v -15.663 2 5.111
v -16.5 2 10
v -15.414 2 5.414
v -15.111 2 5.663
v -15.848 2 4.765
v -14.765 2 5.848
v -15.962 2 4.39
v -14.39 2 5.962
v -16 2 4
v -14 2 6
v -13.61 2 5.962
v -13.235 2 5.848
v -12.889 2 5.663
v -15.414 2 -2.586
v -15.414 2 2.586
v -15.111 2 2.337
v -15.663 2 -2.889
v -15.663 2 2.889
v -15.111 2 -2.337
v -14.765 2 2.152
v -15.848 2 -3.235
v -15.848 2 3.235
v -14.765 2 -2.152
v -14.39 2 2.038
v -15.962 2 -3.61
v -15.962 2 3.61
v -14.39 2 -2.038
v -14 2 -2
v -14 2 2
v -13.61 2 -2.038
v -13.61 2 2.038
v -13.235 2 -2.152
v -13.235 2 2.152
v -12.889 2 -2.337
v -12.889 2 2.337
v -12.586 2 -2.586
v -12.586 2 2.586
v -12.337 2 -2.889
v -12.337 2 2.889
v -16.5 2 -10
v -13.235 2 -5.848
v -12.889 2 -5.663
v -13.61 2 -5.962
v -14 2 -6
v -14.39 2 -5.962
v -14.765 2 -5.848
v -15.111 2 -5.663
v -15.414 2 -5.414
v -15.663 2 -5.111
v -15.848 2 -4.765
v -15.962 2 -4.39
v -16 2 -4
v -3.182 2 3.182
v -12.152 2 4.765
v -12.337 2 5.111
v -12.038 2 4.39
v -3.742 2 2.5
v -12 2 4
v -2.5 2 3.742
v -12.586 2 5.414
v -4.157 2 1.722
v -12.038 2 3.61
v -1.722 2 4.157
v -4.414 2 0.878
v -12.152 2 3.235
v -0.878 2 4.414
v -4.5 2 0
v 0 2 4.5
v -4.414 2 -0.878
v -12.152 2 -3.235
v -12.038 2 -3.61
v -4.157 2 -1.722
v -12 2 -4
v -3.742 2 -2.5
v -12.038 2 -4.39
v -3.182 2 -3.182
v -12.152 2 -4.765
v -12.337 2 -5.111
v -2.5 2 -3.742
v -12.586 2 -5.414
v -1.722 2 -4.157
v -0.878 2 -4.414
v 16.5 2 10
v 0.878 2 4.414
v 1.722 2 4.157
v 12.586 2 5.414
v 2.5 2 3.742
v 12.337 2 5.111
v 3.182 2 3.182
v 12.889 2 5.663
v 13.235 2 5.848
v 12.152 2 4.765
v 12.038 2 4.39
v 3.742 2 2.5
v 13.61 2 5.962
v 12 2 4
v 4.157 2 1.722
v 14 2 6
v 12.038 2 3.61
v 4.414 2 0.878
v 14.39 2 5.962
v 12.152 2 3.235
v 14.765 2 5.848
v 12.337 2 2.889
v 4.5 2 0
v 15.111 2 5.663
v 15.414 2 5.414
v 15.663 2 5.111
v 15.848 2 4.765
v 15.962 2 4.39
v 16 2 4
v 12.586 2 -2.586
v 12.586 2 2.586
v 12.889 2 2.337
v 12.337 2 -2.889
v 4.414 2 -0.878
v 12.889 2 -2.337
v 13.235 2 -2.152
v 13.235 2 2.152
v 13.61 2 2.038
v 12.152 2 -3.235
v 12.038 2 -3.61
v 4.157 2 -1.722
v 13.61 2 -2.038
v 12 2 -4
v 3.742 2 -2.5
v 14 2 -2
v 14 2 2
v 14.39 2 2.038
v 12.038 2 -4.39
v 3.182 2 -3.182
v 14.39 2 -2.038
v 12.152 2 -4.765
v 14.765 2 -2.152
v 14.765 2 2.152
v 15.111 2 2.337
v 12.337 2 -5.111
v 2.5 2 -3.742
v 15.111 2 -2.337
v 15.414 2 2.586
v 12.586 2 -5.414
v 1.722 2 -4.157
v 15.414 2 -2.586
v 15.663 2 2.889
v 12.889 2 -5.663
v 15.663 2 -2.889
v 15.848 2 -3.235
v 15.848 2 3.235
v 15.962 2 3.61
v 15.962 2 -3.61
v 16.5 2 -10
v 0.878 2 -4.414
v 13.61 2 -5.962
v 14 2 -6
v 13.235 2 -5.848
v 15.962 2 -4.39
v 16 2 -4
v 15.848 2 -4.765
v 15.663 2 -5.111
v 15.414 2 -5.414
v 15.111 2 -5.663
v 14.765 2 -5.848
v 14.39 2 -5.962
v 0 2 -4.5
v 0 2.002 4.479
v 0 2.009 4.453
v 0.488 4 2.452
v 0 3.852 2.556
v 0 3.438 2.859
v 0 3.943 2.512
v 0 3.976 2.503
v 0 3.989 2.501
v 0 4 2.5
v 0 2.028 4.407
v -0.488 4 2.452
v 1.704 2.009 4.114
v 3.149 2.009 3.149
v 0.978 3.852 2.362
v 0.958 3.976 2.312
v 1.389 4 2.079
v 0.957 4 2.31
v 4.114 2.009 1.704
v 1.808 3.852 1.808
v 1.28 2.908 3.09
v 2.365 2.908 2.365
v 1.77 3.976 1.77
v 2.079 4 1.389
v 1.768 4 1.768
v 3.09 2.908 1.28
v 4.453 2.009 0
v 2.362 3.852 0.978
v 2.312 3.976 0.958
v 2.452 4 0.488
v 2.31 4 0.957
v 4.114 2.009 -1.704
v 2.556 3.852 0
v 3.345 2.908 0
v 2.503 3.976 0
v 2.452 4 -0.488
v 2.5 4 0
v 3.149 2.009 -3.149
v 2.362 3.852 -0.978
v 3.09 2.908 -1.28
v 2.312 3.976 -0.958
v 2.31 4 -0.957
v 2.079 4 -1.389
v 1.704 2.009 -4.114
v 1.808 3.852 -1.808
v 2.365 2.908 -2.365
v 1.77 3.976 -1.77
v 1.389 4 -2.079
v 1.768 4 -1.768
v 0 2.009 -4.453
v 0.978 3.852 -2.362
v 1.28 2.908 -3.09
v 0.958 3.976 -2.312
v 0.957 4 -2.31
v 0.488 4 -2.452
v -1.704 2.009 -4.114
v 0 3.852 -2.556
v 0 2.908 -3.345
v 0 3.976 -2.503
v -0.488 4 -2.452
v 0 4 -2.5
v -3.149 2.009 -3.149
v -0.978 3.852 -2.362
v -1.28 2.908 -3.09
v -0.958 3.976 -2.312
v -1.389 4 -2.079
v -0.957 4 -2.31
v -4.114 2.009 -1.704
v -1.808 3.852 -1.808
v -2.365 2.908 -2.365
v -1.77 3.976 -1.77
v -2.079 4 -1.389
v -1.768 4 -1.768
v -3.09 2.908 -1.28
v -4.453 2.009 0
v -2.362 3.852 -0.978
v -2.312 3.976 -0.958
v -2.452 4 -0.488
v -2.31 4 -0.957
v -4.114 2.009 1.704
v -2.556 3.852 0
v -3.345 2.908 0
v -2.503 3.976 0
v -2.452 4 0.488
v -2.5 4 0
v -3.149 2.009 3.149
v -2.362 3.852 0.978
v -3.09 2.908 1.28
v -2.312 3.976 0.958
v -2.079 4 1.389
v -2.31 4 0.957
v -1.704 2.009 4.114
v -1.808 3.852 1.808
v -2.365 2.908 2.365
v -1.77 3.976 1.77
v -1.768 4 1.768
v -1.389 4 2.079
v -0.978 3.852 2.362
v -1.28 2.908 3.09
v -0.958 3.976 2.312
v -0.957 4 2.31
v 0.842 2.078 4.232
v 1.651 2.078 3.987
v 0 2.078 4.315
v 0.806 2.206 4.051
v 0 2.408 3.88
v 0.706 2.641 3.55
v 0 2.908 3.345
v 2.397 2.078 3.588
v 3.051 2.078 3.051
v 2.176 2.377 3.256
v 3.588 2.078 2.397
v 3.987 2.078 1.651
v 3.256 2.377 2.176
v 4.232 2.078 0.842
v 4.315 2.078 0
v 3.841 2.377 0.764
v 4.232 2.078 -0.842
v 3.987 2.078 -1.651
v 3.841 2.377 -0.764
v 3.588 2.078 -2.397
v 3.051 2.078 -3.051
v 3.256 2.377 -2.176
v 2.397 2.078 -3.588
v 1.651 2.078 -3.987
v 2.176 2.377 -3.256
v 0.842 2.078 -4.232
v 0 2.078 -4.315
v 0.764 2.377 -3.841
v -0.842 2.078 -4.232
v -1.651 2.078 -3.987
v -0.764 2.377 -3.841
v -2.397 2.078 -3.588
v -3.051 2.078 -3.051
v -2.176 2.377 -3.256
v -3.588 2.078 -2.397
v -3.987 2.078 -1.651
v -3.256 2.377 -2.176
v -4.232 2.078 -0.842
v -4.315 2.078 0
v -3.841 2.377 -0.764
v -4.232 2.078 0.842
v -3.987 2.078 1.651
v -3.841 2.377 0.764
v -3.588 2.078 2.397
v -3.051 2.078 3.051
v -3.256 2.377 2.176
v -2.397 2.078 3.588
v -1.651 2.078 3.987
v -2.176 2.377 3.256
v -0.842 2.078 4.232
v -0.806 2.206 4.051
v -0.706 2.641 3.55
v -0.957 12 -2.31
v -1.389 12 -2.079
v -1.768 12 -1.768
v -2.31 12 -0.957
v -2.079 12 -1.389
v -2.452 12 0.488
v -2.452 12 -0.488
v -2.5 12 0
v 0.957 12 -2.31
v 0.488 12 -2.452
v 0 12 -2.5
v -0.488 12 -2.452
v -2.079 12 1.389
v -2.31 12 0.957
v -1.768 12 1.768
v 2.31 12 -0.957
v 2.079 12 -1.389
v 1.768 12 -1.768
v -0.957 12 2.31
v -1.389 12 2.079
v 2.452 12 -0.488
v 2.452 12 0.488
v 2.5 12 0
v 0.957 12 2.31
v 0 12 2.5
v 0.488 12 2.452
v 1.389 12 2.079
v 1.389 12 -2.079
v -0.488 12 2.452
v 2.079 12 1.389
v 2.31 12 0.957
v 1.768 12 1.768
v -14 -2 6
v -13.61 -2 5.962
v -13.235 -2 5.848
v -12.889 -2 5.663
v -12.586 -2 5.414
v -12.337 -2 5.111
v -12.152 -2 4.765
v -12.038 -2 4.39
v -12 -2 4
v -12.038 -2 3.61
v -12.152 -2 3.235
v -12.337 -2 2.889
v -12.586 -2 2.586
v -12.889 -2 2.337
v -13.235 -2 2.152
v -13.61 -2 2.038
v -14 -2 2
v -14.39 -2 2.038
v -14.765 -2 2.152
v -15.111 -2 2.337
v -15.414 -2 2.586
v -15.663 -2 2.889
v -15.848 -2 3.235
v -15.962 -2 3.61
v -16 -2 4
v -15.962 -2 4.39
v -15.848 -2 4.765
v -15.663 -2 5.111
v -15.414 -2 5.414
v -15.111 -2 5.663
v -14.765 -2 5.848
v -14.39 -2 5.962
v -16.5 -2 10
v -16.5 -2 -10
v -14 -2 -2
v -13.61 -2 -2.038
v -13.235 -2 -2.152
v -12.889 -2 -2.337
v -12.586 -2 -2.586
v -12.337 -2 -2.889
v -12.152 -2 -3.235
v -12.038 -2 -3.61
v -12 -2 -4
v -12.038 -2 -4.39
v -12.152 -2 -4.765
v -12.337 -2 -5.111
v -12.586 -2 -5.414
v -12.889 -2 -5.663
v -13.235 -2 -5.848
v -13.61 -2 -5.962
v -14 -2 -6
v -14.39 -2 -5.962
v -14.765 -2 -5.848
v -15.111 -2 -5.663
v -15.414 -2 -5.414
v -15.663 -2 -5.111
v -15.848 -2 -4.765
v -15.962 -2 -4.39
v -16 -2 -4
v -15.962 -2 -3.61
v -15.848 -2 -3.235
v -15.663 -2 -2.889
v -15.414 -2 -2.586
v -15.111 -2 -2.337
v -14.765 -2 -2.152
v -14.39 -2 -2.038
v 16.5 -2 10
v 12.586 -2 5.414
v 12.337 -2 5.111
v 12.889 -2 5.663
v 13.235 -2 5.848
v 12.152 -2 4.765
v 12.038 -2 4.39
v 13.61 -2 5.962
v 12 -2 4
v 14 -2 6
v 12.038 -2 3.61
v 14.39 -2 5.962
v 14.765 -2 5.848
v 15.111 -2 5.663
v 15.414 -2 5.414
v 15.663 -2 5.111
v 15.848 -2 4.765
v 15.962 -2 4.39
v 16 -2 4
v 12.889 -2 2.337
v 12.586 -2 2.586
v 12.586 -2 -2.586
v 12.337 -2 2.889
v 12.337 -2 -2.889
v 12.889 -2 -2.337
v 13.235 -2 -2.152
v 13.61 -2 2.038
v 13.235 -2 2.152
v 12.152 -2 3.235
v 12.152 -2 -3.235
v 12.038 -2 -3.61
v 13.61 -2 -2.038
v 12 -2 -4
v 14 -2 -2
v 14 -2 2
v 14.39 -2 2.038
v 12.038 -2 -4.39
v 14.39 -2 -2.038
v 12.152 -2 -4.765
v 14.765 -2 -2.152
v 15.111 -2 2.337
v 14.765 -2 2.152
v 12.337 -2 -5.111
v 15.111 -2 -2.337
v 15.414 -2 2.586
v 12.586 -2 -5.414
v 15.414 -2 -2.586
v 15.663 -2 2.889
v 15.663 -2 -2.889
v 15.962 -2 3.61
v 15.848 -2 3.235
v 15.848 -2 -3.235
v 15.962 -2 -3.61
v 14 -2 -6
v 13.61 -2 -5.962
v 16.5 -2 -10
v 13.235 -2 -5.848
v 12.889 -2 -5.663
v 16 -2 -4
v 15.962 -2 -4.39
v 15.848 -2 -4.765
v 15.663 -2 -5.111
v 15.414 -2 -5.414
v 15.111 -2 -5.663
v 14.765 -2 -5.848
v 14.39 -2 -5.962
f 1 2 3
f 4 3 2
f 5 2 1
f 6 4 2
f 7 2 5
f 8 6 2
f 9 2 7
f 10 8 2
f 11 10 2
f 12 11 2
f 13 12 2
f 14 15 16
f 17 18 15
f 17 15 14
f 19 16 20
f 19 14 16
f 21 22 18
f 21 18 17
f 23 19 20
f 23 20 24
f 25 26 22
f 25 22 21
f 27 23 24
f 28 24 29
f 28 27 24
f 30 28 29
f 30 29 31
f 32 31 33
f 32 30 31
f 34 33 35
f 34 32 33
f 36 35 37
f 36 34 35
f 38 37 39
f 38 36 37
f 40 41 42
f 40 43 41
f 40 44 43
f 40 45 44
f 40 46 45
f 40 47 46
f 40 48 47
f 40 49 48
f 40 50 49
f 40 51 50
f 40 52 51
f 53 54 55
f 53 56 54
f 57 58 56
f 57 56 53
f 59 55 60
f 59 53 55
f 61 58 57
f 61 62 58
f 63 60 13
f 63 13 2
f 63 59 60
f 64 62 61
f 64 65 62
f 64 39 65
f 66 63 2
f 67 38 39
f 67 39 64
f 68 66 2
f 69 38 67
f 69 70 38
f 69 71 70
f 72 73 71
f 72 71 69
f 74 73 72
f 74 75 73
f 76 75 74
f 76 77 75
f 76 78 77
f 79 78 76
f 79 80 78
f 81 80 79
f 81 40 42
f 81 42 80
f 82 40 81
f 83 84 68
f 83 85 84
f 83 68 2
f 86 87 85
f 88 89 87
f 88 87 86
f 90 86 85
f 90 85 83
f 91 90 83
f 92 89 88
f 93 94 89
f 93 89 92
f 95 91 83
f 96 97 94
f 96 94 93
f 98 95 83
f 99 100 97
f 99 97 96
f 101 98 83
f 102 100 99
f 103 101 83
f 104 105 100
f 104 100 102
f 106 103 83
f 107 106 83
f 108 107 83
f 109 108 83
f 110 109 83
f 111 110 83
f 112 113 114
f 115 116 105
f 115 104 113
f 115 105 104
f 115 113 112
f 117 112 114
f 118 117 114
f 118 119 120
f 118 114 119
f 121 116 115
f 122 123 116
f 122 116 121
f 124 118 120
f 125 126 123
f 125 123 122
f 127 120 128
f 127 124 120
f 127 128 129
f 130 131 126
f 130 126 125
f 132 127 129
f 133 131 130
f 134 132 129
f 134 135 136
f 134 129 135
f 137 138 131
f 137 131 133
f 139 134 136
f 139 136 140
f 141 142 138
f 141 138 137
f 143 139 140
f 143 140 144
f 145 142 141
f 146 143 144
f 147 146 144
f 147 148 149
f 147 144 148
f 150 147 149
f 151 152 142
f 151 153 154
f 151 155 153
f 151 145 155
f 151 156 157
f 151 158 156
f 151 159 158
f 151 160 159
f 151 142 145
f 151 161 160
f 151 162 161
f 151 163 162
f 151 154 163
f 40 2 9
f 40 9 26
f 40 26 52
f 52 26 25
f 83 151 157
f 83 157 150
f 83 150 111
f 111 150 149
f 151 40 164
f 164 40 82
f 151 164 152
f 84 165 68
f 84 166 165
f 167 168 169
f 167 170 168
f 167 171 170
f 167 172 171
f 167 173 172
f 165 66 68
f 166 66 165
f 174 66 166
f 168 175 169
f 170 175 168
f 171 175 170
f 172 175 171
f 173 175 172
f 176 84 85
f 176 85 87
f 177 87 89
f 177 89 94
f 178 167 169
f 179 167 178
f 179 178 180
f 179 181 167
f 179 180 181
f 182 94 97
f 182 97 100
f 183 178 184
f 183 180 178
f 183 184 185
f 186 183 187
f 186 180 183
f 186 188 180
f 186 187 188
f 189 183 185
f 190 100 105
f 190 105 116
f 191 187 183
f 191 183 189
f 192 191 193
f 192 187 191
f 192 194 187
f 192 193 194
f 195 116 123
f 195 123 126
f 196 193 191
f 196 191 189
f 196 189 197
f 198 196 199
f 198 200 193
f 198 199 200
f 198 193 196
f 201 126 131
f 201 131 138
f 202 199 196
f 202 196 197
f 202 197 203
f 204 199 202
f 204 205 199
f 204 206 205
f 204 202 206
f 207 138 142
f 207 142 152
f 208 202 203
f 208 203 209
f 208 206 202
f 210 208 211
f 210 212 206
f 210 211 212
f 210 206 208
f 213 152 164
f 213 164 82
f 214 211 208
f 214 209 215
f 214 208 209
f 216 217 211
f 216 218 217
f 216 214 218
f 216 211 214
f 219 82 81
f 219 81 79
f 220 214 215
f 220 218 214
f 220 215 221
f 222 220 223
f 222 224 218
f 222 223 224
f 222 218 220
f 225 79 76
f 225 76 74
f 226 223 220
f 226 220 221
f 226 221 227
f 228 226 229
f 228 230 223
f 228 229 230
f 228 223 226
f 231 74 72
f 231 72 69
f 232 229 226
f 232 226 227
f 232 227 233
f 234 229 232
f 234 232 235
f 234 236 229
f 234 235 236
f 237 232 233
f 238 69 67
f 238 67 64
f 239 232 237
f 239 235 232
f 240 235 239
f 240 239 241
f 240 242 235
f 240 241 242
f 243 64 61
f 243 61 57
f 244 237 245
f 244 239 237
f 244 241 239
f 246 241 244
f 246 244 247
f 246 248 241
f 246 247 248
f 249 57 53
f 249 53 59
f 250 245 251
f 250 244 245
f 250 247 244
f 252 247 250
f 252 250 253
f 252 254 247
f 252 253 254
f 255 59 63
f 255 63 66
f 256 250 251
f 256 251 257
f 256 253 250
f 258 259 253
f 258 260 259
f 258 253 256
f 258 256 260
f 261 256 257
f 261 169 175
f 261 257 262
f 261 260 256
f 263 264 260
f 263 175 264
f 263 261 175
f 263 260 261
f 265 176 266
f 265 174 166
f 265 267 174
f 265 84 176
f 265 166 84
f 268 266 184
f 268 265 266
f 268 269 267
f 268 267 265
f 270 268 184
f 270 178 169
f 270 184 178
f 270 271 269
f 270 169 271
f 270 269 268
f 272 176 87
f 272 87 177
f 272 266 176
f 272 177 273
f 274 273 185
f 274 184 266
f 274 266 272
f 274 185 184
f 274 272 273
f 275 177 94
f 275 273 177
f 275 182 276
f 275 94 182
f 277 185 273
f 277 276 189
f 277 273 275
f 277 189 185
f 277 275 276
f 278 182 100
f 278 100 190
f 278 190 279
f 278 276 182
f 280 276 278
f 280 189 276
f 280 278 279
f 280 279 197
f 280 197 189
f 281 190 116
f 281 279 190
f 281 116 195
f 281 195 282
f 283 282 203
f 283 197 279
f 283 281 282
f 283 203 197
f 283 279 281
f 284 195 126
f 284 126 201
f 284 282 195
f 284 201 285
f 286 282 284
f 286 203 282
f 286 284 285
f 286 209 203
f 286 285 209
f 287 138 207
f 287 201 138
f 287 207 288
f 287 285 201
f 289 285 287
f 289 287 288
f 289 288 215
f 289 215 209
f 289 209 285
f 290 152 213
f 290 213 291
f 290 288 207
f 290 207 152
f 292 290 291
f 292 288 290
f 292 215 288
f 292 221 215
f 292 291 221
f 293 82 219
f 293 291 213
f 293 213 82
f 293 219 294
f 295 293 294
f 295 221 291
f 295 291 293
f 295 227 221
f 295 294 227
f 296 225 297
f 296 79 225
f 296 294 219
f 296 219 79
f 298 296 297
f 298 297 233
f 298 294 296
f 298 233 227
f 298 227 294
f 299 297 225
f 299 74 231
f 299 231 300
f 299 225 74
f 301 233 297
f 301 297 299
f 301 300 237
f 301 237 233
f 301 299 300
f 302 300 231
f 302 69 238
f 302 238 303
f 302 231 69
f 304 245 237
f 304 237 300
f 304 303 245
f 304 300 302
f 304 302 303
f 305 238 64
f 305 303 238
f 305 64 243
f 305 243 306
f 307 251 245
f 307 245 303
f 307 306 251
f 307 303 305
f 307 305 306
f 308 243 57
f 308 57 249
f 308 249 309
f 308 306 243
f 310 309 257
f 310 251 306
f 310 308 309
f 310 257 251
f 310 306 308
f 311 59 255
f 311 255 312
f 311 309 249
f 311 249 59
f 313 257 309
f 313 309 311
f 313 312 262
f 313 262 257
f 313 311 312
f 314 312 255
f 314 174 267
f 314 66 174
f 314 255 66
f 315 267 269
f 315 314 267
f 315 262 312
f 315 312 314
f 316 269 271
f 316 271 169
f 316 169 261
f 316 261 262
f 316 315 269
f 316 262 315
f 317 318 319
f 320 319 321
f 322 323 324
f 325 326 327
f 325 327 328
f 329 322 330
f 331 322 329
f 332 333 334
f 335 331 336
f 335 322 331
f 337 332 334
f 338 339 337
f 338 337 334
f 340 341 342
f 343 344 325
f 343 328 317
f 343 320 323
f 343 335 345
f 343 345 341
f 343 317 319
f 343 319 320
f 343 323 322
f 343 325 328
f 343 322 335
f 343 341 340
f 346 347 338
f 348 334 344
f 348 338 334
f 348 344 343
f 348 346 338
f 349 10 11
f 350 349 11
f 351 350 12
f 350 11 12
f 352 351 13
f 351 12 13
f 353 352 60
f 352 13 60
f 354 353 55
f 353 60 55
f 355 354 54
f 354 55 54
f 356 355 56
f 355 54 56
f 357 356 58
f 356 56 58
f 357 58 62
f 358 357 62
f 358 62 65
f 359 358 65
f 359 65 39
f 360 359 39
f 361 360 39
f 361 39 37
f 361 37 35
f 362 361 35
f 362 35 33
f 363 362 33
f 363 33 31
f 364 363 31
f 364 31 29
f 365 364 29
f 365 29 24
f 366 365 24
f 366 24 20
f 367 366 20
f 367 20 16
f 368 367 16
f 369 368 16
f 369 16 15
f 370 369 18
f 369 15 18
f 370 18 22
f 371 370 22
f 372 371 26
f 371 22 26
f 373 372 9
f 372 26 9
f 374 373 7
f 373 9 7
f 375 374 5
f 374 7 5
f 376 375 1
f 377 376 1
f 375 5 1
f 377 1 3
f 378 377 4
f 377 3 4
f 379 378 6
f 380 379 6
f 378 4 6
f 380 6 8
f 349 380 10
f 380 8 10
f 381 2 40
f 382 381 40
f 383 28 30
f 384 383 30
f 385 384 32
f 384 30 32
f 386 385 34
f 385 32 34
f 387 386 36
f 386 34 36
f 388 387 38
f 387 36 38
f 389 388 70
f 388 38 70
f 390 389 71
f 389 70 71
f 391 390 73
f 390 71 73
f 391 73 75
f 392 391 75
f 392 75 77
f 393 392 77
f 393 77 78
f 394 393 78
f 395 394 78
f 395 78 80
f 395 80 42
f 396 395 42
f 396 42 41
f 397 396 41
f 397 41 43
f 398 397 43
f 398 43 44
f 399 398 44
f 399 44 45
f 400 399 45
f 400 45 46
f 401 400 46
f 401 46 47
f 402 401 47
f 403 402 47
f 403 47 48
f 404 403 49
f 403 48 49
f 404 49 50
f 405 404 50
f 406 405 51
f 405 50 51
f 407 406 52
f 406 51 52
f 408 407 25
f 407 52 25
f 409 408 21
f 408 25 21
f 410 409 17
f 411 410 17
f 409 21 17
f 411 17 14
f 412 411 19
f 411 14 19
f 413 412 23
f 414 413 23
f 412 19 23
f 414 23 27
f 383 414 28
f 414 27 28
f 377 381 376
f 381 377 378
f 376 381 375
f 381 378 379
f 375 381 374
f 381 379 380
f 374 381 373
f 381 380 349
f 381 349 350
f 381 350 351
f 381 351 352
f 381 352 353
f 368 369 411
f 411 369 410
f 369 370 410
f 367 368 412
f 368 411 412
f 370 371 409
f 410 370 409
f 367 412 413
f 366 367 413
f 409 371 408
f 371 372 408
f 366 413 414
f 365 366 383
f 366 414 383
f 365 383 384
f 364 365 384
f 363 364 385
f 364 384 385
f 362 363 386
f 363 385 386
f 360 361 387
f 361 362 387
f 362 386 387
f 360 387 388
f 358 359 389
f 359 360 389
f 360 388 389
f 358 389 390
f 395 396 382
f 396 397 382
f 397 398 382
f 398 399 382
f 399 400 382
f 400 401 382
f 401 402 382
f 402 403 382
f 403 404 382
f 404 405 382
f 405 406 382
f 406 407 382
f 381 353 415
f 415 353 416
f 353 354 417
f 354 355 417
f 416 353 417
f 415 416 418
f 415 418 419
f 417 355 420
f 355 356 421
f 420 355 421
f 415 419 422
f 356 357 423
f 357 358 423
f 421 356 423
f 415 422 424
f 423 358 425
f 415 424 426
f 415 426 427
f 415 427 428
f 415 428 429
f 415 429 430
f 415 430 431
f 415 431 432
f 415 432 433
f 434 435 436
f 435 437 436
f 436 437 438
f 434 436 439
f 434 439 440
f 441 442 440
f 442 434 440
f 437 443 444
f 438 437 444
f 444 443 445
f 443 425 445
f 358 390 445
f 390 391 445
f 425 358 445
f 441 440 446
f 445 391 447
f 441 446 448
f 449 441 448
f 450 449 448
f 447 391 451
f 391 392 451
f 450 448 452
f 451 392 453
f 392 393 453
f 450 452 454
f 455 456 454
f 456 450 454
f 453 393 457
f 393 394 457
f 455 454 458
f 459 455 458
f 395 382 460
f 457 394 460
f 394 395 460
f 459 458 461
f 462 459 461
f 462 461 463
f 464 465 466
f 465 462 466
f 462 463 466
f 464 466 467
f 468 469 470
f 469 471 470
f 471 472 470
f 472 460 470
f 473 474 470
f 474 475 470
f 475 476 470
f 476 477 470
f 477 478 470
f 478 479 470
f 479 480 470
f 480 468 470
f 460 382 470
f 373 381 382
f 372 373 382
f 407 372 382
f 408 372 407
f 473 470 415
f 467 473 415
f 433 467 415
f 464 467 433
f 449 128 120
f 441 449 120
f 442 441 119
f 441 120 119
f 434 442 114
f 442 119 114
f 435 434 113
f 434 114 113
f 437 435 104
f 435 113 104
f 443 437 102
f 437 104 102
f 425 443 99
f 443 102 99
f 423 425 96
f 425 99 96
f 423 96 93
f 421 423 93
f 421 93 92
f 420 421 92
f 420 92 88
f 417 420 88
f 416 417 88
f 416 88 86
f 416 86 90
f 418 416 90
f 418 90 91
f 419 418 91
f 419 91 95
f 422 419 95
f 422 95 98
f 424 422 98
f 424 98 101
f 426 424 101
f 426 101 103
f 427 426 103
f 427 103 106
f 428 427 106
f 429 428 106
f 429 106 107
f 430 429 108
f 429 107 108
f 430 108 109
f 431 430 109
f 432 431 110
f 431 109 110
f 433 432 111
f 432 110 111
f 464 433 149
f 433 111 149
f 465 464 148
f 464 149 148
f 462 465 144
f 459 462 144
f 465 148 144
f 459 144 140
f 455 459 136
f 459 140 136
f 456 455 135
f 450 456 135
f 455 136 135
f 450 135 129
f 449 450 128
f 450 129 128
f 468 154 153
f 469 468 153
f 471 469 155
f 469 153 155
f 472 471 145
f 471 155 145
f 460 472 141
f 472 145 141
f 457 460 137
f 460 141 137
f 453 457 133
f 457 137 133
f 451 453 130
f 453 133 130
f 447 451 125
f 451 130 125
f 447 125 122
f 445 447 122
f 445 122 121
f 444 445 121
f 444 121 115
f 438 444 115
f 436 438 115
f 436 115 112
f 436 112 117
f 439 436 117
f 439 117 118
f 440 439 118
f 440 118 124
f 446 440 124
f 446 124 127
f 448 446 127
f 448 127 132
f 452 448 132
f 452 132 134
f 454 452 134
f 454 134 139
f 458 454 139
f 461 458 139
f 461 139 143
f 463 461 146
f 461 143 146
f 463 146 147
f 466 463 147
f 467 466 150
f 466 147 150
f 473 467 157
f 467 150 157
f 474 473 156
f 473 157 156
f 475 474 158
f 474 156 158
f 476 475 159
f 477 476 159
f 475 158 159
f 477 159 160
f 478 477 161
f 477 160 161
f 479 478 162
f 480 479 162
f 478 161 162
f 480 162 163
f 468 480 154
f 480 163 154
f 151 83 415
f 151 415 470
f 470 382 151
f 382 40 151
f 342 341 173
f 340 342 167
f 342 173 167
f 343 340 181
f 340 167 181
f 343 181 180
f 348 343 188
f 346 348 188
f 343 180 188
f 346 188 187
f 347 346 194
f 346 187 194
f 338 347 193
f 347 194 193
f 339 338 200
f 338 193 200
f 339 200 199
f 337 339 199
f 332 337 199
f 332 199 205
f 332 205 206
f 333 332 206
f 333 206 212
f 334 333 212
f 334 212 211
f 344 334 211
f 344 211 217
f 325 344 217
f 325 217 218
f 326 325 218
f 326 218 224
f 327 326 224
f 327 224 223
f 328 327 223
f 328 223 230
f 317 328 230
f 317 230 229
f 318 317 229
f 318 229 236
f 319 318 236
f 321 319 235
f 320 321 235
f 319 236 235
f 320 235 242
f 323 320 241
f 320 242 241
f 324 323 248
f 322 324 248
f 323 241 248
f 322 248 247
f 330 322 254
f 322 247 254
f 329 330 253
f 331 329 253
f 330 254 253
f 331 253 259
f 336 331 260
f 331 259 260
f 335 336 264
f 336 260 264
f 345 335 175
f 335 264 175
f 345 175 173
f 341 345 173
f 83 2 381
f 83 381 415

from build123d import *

# Parameters (mm, degrees)
SKETCH1_W           = 33
SKETCH1_H           = 20
BOSS_EXTRUDE1_DEPTH = 2
SKETCH2_R           = 2
CUT_EXTRUDE1_DEPTH  = 20.704060495
SKETCH3_R           = 2.5
BOSS_EXTRUDE2_DEPTH = 10
FILLET1_SIZE        = 2


with BuildPart() as part:
    # Sketch1 → Boss-Extrude1 (new, symmetric)
    with BuildSketch(Plane(origin=(0, 0, 0), x_dir=(1, 0, 0), z_dir=(0, 1, 0))):
        Rectangle(SKETCH1_W, SKETCH1_H)
    extrude(amount=BOSS_EXTRUDE1_DEPTH, both=True)

    # Sketch2 → Cut-Extrude1 (cut, through all)
    with BuildSketch(Plane(origin=(0, 2, 0), x_dir=(1, 0, 0), z_dir=(0, 1, 0))):
        with Locations(Location((-14, 4, 0), (0, 0, 270))):
            Circle(SKETCH2_R)
        with Locations(Location((-14, -4, 0), (0, 0, 270))):
            Circle(SKETCH2_R)
        with Locations(Location((14, -4, 0), (0, 0, 90))):
            Circle(SKETCH2_R)
        with Locations(Location((14, 4, 0), (0, 0, 90))):
            Circle(SKETCH2_R)
    extrude(amount=-CUT_EXTRUDE1_DEPTH, mode=Mode.SUBTRACT)

    # Sketch3 → Boss-Extrude2 (add)
    with BuildSketch(Plane(origin=(0, 2, 0), x_dir=(1, 0, 0), z_dir=(0, 1, 0))):
        with Locations(Location((0, 0, 0), (0, 0, 270))):
            Circle(SKETCH3_R)
    extrude(amount=BOSS_EXTRUDE2_DEPTH)

    # Fillet1
    # a fillet whose section is not a circle: 2 mm, written as the material it adds along each edge
    with BuildSketch(Plane(origin=(0, 2, 0), x_dir=(0, 0, 1), z_dir=(-1, 0, 0))) as fillet1_piece_1:
        with BuildLine():
            Bezier((2.5 + FILLET1_SIZE, 0), (2.5, 0), (2.5, FILLET1_SIZE), weights=[1, 0.141421356, 1])
            Line((2.5, FILLET1_SIZE), (2.5, 0))
            Line((2.5, 0), (2.5 + FILLET1_SIZE, 0))
        make_face()
    revolve(axis=Axis((0, 2, 0), (0, 1, 0)))


solid = part.part
